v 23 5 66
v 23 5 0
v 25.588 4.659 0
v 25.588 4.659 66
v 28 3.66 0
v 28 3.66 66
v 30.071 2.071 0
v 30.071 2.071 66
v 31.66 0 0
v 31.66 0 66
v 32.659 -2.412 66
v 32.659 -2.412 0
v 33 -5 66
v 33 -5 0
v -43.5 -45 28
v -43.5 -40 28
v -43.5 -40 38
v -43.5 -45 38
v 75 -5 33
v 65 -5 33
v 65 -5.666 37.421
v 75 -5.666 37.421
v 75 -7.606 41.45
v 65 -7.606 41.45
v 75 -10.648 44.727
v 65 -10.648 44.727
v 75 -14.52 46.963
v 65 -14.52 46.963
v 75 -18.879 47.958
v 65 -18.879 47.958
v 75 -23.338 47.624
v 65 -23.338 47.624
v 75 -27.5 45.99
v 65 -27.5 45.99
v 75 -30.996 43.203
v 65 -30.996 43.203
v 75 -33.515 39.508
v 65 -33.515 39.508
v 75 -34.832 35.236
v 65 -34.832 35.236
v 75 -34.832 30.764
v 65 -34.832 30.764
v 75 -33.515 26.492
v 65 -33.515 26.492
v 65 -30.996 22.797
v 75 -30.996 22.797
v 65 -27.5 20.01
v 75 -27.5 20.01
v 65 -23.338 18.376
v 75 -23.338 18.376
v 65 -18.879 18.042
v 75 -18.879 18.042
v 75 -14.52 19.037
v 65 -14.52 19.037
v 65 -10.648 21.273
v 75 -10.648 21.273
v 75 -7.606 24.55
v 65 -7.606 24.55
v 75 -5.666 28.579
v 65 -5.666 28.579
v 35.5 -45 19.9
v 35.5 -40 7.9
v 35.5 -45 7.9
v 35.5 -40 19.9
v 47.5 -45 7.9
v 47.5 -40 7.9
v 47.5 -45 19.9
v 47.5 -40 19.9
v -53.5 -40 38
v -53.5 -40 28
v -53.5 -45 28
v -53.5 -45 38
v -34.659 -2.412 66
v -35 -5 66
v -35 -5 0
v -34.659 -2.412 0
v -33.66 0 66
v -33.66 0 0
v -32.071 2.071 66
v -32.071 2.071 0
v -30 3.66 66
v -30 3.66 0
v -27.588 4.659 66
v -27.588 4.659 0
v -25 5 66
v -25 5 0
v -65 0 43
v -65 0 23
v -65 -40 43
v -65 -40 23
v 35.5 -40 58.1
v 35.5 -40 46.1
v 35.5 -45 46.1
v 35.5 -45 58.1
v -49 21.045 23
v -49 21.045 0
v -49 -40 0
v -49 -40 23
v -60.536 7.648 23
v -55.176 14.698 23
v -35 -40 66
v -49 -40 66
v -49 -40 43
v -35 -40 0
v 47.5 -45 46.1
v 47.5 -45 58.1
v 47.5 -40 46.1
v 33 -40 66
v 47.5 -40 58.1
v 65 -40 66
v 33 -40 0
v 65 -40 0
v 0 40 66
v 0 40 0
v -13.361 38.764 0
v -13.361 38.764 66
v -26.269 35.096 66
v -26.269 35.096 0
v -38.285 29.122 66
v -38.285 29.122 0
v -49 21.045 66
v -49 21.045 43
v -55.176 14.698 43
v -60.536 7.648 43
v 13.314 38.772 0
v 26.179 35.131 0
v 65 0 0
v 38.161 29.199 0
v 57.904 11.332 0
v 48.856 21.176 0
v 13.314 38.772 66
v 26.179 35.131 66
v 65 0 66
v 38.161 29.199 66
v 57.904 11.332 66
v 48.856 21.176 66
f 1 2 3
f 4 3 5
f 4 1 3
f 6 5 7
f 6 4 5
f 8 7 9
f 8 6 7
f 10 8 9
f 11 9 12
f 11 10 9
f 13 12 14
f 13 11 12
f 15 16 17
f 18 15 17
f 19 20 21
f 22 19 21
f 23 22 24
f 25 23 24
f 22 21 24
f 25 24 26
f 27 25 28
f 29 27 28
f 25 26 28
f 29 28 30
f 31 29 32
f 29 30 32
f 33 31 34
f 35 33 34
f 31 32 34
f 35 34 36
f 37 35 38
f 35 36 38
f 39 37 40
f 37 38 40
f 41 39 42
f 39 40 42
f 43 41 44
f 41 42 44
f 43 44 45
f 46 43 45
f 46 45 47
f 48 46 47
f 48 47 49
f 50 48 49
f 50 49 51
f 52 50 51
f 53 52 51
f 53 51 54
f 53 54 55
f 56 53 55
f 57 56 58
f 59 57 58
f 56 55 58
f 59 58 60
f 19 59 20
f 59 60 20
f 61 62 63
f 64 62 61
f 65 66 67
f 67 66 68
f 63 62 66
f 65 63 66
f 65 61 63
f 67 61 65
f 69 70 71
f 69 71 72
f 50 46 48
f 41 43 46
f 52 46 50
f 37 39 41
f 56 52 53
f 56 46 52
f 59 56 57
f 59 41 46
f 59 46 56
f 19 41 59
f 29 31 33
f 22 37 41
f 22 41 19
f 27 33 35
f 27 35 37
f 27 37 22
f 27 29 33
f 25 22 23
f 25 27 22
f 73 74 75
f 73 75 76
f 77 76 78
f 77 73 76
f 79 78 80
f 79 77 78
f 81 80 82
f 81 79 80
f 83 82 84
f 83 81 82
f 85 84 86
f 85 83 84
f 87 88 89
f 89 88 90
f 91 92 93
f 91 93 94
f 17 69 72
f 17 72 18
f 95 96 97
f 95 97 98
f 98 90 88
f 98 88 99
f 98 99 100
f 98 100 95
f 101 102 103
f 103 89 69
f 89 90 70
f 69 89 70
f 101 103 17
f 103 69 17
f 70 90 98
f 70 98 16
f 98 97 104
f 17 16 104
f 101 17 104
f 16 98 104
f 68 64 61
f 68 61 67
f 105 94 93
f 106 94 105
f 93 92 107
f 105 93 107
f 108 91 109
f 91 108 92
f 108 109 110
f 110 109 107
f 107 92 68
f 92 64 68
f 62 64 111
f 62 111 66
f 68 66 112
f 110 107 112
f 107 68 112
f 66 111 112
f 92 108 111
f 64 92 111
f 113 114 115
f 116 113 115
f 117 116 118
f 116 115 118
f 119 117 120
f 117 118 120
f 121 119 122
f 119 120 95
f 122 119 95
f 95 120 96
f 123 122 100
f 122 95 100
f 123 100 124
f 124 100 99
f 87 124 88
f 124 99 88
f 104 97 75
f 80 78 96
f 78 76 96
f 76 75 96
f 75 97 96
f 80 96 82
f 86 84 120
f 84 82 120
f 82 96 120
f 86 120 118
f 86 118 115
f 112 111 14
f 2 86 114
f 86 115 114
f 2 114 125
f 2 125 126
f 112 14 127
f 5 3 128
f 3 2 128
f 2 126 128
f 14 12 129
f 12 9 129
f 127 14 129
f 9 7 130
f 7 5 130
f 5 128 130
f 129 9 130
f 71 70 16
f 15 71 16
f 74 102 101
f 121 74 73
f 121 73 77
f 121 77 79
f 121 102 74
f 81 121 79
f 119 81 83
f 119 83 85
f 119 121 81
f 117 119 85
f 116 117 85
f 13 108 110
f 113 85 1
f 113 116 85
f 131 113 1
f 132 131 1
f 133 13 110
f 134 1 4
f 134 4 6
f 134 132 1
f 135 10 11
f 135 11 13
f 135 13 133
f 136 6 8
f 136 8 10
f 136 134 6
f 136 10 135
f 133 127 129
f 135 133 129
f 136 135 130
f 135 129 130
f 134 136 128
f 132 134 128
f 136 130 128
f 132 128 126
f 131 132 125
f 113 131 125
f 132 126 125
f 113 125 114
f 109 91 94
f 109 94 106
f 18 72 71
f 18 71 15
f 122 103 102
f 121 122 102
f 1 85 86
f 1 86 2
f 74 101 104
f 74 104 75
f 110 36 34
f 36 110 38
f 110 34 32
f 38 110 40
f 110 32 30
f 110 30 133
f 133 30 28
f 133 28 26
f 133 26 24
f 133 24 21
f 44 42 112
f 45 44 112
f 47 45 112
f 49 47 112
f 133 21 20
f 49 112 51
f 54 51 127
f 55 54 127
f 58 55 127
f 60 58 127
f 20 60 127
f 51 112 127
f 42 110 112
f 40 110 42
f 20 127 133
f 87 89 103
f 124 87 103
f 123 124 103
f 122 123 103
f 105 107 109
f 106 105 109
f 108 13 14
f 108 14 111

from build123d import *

# Parameters (mm, degrees)
BOSS_EXTRUDE1_DEPTH = 66
SKETCH4_R           = 15
BOSS_EXTRUDE2_DEPTH = 10
CUT_EXTRUDE2_DEPTH  = 108.615054709
SKETCH5_W           = 16
SKETCH5_H           = 23
CUT_EXTRUDE3_DEPTH  = 128.988280714
SKETCH6_W           = 10
SKETCH6_H           = 10
BOSS_EXTRUDE3_DEPTH = 5
SKETCH7_W           = 12
SKETCH7_H           = 12
BOSS_EXTRUDE4_DEPTH = 5


with BuildPart() as part:
    # Sketch2 → Boss-Extrude1 (new body)
    with BuildSketch(Plane.XY):
        with BuildLine():
            ThreePointArc((65, 0), (38.160843726, 29.198871234), (-1.89e-07, 40))
            ThreePointArc((-1.89e-07, 40), (-38.160843886, 29.198871136), (-65, 0))
            Line((-65, 0), (-65, -40))
            Line((-65, -40), (65, -40))
            Line((65, -40), (65, 0))
        make_face()
    extrude(amount=BOSS_EXTRUDE1_DEPTH)

    # Sketch4 → Boss-Extrude2 (add)
    with BuildSketch(Plane(origin=(65, 0, 0), x_dir=(0, 0, -1), z_dir=(1, 0, 0))):
        with Locations(Location((-33, -20, 0), (0, 0, 90))):
            Circle(SKETCH4_R)
    extrude(amount=BOSS_EXTRUDE2_DEPTH)

    # Sketch3 → Cut-Extrude2 (cut, through all)
    with BuildSketch(Plane.XY.offset(66)):
        with BuildLine():
            Line((-25, 5), (23, 5))
            ThreePointArc((23, 5), (30.071067812, 2.071067812), (33, -5))
            Line((33, -5), (33, -40))
            Line((33, -40), (-35, -40))
            Line((-35, -40), (-35, -5))
            ThreePointArc((-35, -5), (-32.071067812, 2.071067812), (-25, 5))
        make_face()
    extrude(amount=-CUT_EXTRUDE2_DEPTH, mode=Mode.SUBTRACT)

    # Sketch5 → Cut-Extrude3 (cut, through all)
    with BuildSketch(Plane.XZ.offset(40)):
        with Locations((-57, 54.5)):
            Rectangle(SKETCH5_W, SKETCH5_H)
        with Locations((-57, 11.5)):
            Rectangle(SKETCH5_W, SKETCH5_H)
    extrude(amount=-CUT_EXTRUDE3_DEPTH, mode=Mode.SUBTRACT)

    # Sketch6 → Boss-Extrude3 (add)
    with BuildSketch(Plane.XZ.offset(40)):
        with Locations((-48.5, 33)):
            Rectangle(SKETCH6_W, SKETCH6_H)
    extrude(amount=BOSS_EXTRUDE3_DEPTH)

    # Sketch7 → Boss-Extrude4 (add)
    with BuildSketch(Plane.XZ.offset(40)):
        with Locations((41.5, 13.9)):
            Rectangle(SKETCH7_W, SKETCH7_H)
        with Locations((41.5, 52.1)):
            Rectangle(SKETCH7_W, SKETCH7_H)
    extrude(amount=BOSS_EXTRUDE4_DEPTH)


solid = part.part
